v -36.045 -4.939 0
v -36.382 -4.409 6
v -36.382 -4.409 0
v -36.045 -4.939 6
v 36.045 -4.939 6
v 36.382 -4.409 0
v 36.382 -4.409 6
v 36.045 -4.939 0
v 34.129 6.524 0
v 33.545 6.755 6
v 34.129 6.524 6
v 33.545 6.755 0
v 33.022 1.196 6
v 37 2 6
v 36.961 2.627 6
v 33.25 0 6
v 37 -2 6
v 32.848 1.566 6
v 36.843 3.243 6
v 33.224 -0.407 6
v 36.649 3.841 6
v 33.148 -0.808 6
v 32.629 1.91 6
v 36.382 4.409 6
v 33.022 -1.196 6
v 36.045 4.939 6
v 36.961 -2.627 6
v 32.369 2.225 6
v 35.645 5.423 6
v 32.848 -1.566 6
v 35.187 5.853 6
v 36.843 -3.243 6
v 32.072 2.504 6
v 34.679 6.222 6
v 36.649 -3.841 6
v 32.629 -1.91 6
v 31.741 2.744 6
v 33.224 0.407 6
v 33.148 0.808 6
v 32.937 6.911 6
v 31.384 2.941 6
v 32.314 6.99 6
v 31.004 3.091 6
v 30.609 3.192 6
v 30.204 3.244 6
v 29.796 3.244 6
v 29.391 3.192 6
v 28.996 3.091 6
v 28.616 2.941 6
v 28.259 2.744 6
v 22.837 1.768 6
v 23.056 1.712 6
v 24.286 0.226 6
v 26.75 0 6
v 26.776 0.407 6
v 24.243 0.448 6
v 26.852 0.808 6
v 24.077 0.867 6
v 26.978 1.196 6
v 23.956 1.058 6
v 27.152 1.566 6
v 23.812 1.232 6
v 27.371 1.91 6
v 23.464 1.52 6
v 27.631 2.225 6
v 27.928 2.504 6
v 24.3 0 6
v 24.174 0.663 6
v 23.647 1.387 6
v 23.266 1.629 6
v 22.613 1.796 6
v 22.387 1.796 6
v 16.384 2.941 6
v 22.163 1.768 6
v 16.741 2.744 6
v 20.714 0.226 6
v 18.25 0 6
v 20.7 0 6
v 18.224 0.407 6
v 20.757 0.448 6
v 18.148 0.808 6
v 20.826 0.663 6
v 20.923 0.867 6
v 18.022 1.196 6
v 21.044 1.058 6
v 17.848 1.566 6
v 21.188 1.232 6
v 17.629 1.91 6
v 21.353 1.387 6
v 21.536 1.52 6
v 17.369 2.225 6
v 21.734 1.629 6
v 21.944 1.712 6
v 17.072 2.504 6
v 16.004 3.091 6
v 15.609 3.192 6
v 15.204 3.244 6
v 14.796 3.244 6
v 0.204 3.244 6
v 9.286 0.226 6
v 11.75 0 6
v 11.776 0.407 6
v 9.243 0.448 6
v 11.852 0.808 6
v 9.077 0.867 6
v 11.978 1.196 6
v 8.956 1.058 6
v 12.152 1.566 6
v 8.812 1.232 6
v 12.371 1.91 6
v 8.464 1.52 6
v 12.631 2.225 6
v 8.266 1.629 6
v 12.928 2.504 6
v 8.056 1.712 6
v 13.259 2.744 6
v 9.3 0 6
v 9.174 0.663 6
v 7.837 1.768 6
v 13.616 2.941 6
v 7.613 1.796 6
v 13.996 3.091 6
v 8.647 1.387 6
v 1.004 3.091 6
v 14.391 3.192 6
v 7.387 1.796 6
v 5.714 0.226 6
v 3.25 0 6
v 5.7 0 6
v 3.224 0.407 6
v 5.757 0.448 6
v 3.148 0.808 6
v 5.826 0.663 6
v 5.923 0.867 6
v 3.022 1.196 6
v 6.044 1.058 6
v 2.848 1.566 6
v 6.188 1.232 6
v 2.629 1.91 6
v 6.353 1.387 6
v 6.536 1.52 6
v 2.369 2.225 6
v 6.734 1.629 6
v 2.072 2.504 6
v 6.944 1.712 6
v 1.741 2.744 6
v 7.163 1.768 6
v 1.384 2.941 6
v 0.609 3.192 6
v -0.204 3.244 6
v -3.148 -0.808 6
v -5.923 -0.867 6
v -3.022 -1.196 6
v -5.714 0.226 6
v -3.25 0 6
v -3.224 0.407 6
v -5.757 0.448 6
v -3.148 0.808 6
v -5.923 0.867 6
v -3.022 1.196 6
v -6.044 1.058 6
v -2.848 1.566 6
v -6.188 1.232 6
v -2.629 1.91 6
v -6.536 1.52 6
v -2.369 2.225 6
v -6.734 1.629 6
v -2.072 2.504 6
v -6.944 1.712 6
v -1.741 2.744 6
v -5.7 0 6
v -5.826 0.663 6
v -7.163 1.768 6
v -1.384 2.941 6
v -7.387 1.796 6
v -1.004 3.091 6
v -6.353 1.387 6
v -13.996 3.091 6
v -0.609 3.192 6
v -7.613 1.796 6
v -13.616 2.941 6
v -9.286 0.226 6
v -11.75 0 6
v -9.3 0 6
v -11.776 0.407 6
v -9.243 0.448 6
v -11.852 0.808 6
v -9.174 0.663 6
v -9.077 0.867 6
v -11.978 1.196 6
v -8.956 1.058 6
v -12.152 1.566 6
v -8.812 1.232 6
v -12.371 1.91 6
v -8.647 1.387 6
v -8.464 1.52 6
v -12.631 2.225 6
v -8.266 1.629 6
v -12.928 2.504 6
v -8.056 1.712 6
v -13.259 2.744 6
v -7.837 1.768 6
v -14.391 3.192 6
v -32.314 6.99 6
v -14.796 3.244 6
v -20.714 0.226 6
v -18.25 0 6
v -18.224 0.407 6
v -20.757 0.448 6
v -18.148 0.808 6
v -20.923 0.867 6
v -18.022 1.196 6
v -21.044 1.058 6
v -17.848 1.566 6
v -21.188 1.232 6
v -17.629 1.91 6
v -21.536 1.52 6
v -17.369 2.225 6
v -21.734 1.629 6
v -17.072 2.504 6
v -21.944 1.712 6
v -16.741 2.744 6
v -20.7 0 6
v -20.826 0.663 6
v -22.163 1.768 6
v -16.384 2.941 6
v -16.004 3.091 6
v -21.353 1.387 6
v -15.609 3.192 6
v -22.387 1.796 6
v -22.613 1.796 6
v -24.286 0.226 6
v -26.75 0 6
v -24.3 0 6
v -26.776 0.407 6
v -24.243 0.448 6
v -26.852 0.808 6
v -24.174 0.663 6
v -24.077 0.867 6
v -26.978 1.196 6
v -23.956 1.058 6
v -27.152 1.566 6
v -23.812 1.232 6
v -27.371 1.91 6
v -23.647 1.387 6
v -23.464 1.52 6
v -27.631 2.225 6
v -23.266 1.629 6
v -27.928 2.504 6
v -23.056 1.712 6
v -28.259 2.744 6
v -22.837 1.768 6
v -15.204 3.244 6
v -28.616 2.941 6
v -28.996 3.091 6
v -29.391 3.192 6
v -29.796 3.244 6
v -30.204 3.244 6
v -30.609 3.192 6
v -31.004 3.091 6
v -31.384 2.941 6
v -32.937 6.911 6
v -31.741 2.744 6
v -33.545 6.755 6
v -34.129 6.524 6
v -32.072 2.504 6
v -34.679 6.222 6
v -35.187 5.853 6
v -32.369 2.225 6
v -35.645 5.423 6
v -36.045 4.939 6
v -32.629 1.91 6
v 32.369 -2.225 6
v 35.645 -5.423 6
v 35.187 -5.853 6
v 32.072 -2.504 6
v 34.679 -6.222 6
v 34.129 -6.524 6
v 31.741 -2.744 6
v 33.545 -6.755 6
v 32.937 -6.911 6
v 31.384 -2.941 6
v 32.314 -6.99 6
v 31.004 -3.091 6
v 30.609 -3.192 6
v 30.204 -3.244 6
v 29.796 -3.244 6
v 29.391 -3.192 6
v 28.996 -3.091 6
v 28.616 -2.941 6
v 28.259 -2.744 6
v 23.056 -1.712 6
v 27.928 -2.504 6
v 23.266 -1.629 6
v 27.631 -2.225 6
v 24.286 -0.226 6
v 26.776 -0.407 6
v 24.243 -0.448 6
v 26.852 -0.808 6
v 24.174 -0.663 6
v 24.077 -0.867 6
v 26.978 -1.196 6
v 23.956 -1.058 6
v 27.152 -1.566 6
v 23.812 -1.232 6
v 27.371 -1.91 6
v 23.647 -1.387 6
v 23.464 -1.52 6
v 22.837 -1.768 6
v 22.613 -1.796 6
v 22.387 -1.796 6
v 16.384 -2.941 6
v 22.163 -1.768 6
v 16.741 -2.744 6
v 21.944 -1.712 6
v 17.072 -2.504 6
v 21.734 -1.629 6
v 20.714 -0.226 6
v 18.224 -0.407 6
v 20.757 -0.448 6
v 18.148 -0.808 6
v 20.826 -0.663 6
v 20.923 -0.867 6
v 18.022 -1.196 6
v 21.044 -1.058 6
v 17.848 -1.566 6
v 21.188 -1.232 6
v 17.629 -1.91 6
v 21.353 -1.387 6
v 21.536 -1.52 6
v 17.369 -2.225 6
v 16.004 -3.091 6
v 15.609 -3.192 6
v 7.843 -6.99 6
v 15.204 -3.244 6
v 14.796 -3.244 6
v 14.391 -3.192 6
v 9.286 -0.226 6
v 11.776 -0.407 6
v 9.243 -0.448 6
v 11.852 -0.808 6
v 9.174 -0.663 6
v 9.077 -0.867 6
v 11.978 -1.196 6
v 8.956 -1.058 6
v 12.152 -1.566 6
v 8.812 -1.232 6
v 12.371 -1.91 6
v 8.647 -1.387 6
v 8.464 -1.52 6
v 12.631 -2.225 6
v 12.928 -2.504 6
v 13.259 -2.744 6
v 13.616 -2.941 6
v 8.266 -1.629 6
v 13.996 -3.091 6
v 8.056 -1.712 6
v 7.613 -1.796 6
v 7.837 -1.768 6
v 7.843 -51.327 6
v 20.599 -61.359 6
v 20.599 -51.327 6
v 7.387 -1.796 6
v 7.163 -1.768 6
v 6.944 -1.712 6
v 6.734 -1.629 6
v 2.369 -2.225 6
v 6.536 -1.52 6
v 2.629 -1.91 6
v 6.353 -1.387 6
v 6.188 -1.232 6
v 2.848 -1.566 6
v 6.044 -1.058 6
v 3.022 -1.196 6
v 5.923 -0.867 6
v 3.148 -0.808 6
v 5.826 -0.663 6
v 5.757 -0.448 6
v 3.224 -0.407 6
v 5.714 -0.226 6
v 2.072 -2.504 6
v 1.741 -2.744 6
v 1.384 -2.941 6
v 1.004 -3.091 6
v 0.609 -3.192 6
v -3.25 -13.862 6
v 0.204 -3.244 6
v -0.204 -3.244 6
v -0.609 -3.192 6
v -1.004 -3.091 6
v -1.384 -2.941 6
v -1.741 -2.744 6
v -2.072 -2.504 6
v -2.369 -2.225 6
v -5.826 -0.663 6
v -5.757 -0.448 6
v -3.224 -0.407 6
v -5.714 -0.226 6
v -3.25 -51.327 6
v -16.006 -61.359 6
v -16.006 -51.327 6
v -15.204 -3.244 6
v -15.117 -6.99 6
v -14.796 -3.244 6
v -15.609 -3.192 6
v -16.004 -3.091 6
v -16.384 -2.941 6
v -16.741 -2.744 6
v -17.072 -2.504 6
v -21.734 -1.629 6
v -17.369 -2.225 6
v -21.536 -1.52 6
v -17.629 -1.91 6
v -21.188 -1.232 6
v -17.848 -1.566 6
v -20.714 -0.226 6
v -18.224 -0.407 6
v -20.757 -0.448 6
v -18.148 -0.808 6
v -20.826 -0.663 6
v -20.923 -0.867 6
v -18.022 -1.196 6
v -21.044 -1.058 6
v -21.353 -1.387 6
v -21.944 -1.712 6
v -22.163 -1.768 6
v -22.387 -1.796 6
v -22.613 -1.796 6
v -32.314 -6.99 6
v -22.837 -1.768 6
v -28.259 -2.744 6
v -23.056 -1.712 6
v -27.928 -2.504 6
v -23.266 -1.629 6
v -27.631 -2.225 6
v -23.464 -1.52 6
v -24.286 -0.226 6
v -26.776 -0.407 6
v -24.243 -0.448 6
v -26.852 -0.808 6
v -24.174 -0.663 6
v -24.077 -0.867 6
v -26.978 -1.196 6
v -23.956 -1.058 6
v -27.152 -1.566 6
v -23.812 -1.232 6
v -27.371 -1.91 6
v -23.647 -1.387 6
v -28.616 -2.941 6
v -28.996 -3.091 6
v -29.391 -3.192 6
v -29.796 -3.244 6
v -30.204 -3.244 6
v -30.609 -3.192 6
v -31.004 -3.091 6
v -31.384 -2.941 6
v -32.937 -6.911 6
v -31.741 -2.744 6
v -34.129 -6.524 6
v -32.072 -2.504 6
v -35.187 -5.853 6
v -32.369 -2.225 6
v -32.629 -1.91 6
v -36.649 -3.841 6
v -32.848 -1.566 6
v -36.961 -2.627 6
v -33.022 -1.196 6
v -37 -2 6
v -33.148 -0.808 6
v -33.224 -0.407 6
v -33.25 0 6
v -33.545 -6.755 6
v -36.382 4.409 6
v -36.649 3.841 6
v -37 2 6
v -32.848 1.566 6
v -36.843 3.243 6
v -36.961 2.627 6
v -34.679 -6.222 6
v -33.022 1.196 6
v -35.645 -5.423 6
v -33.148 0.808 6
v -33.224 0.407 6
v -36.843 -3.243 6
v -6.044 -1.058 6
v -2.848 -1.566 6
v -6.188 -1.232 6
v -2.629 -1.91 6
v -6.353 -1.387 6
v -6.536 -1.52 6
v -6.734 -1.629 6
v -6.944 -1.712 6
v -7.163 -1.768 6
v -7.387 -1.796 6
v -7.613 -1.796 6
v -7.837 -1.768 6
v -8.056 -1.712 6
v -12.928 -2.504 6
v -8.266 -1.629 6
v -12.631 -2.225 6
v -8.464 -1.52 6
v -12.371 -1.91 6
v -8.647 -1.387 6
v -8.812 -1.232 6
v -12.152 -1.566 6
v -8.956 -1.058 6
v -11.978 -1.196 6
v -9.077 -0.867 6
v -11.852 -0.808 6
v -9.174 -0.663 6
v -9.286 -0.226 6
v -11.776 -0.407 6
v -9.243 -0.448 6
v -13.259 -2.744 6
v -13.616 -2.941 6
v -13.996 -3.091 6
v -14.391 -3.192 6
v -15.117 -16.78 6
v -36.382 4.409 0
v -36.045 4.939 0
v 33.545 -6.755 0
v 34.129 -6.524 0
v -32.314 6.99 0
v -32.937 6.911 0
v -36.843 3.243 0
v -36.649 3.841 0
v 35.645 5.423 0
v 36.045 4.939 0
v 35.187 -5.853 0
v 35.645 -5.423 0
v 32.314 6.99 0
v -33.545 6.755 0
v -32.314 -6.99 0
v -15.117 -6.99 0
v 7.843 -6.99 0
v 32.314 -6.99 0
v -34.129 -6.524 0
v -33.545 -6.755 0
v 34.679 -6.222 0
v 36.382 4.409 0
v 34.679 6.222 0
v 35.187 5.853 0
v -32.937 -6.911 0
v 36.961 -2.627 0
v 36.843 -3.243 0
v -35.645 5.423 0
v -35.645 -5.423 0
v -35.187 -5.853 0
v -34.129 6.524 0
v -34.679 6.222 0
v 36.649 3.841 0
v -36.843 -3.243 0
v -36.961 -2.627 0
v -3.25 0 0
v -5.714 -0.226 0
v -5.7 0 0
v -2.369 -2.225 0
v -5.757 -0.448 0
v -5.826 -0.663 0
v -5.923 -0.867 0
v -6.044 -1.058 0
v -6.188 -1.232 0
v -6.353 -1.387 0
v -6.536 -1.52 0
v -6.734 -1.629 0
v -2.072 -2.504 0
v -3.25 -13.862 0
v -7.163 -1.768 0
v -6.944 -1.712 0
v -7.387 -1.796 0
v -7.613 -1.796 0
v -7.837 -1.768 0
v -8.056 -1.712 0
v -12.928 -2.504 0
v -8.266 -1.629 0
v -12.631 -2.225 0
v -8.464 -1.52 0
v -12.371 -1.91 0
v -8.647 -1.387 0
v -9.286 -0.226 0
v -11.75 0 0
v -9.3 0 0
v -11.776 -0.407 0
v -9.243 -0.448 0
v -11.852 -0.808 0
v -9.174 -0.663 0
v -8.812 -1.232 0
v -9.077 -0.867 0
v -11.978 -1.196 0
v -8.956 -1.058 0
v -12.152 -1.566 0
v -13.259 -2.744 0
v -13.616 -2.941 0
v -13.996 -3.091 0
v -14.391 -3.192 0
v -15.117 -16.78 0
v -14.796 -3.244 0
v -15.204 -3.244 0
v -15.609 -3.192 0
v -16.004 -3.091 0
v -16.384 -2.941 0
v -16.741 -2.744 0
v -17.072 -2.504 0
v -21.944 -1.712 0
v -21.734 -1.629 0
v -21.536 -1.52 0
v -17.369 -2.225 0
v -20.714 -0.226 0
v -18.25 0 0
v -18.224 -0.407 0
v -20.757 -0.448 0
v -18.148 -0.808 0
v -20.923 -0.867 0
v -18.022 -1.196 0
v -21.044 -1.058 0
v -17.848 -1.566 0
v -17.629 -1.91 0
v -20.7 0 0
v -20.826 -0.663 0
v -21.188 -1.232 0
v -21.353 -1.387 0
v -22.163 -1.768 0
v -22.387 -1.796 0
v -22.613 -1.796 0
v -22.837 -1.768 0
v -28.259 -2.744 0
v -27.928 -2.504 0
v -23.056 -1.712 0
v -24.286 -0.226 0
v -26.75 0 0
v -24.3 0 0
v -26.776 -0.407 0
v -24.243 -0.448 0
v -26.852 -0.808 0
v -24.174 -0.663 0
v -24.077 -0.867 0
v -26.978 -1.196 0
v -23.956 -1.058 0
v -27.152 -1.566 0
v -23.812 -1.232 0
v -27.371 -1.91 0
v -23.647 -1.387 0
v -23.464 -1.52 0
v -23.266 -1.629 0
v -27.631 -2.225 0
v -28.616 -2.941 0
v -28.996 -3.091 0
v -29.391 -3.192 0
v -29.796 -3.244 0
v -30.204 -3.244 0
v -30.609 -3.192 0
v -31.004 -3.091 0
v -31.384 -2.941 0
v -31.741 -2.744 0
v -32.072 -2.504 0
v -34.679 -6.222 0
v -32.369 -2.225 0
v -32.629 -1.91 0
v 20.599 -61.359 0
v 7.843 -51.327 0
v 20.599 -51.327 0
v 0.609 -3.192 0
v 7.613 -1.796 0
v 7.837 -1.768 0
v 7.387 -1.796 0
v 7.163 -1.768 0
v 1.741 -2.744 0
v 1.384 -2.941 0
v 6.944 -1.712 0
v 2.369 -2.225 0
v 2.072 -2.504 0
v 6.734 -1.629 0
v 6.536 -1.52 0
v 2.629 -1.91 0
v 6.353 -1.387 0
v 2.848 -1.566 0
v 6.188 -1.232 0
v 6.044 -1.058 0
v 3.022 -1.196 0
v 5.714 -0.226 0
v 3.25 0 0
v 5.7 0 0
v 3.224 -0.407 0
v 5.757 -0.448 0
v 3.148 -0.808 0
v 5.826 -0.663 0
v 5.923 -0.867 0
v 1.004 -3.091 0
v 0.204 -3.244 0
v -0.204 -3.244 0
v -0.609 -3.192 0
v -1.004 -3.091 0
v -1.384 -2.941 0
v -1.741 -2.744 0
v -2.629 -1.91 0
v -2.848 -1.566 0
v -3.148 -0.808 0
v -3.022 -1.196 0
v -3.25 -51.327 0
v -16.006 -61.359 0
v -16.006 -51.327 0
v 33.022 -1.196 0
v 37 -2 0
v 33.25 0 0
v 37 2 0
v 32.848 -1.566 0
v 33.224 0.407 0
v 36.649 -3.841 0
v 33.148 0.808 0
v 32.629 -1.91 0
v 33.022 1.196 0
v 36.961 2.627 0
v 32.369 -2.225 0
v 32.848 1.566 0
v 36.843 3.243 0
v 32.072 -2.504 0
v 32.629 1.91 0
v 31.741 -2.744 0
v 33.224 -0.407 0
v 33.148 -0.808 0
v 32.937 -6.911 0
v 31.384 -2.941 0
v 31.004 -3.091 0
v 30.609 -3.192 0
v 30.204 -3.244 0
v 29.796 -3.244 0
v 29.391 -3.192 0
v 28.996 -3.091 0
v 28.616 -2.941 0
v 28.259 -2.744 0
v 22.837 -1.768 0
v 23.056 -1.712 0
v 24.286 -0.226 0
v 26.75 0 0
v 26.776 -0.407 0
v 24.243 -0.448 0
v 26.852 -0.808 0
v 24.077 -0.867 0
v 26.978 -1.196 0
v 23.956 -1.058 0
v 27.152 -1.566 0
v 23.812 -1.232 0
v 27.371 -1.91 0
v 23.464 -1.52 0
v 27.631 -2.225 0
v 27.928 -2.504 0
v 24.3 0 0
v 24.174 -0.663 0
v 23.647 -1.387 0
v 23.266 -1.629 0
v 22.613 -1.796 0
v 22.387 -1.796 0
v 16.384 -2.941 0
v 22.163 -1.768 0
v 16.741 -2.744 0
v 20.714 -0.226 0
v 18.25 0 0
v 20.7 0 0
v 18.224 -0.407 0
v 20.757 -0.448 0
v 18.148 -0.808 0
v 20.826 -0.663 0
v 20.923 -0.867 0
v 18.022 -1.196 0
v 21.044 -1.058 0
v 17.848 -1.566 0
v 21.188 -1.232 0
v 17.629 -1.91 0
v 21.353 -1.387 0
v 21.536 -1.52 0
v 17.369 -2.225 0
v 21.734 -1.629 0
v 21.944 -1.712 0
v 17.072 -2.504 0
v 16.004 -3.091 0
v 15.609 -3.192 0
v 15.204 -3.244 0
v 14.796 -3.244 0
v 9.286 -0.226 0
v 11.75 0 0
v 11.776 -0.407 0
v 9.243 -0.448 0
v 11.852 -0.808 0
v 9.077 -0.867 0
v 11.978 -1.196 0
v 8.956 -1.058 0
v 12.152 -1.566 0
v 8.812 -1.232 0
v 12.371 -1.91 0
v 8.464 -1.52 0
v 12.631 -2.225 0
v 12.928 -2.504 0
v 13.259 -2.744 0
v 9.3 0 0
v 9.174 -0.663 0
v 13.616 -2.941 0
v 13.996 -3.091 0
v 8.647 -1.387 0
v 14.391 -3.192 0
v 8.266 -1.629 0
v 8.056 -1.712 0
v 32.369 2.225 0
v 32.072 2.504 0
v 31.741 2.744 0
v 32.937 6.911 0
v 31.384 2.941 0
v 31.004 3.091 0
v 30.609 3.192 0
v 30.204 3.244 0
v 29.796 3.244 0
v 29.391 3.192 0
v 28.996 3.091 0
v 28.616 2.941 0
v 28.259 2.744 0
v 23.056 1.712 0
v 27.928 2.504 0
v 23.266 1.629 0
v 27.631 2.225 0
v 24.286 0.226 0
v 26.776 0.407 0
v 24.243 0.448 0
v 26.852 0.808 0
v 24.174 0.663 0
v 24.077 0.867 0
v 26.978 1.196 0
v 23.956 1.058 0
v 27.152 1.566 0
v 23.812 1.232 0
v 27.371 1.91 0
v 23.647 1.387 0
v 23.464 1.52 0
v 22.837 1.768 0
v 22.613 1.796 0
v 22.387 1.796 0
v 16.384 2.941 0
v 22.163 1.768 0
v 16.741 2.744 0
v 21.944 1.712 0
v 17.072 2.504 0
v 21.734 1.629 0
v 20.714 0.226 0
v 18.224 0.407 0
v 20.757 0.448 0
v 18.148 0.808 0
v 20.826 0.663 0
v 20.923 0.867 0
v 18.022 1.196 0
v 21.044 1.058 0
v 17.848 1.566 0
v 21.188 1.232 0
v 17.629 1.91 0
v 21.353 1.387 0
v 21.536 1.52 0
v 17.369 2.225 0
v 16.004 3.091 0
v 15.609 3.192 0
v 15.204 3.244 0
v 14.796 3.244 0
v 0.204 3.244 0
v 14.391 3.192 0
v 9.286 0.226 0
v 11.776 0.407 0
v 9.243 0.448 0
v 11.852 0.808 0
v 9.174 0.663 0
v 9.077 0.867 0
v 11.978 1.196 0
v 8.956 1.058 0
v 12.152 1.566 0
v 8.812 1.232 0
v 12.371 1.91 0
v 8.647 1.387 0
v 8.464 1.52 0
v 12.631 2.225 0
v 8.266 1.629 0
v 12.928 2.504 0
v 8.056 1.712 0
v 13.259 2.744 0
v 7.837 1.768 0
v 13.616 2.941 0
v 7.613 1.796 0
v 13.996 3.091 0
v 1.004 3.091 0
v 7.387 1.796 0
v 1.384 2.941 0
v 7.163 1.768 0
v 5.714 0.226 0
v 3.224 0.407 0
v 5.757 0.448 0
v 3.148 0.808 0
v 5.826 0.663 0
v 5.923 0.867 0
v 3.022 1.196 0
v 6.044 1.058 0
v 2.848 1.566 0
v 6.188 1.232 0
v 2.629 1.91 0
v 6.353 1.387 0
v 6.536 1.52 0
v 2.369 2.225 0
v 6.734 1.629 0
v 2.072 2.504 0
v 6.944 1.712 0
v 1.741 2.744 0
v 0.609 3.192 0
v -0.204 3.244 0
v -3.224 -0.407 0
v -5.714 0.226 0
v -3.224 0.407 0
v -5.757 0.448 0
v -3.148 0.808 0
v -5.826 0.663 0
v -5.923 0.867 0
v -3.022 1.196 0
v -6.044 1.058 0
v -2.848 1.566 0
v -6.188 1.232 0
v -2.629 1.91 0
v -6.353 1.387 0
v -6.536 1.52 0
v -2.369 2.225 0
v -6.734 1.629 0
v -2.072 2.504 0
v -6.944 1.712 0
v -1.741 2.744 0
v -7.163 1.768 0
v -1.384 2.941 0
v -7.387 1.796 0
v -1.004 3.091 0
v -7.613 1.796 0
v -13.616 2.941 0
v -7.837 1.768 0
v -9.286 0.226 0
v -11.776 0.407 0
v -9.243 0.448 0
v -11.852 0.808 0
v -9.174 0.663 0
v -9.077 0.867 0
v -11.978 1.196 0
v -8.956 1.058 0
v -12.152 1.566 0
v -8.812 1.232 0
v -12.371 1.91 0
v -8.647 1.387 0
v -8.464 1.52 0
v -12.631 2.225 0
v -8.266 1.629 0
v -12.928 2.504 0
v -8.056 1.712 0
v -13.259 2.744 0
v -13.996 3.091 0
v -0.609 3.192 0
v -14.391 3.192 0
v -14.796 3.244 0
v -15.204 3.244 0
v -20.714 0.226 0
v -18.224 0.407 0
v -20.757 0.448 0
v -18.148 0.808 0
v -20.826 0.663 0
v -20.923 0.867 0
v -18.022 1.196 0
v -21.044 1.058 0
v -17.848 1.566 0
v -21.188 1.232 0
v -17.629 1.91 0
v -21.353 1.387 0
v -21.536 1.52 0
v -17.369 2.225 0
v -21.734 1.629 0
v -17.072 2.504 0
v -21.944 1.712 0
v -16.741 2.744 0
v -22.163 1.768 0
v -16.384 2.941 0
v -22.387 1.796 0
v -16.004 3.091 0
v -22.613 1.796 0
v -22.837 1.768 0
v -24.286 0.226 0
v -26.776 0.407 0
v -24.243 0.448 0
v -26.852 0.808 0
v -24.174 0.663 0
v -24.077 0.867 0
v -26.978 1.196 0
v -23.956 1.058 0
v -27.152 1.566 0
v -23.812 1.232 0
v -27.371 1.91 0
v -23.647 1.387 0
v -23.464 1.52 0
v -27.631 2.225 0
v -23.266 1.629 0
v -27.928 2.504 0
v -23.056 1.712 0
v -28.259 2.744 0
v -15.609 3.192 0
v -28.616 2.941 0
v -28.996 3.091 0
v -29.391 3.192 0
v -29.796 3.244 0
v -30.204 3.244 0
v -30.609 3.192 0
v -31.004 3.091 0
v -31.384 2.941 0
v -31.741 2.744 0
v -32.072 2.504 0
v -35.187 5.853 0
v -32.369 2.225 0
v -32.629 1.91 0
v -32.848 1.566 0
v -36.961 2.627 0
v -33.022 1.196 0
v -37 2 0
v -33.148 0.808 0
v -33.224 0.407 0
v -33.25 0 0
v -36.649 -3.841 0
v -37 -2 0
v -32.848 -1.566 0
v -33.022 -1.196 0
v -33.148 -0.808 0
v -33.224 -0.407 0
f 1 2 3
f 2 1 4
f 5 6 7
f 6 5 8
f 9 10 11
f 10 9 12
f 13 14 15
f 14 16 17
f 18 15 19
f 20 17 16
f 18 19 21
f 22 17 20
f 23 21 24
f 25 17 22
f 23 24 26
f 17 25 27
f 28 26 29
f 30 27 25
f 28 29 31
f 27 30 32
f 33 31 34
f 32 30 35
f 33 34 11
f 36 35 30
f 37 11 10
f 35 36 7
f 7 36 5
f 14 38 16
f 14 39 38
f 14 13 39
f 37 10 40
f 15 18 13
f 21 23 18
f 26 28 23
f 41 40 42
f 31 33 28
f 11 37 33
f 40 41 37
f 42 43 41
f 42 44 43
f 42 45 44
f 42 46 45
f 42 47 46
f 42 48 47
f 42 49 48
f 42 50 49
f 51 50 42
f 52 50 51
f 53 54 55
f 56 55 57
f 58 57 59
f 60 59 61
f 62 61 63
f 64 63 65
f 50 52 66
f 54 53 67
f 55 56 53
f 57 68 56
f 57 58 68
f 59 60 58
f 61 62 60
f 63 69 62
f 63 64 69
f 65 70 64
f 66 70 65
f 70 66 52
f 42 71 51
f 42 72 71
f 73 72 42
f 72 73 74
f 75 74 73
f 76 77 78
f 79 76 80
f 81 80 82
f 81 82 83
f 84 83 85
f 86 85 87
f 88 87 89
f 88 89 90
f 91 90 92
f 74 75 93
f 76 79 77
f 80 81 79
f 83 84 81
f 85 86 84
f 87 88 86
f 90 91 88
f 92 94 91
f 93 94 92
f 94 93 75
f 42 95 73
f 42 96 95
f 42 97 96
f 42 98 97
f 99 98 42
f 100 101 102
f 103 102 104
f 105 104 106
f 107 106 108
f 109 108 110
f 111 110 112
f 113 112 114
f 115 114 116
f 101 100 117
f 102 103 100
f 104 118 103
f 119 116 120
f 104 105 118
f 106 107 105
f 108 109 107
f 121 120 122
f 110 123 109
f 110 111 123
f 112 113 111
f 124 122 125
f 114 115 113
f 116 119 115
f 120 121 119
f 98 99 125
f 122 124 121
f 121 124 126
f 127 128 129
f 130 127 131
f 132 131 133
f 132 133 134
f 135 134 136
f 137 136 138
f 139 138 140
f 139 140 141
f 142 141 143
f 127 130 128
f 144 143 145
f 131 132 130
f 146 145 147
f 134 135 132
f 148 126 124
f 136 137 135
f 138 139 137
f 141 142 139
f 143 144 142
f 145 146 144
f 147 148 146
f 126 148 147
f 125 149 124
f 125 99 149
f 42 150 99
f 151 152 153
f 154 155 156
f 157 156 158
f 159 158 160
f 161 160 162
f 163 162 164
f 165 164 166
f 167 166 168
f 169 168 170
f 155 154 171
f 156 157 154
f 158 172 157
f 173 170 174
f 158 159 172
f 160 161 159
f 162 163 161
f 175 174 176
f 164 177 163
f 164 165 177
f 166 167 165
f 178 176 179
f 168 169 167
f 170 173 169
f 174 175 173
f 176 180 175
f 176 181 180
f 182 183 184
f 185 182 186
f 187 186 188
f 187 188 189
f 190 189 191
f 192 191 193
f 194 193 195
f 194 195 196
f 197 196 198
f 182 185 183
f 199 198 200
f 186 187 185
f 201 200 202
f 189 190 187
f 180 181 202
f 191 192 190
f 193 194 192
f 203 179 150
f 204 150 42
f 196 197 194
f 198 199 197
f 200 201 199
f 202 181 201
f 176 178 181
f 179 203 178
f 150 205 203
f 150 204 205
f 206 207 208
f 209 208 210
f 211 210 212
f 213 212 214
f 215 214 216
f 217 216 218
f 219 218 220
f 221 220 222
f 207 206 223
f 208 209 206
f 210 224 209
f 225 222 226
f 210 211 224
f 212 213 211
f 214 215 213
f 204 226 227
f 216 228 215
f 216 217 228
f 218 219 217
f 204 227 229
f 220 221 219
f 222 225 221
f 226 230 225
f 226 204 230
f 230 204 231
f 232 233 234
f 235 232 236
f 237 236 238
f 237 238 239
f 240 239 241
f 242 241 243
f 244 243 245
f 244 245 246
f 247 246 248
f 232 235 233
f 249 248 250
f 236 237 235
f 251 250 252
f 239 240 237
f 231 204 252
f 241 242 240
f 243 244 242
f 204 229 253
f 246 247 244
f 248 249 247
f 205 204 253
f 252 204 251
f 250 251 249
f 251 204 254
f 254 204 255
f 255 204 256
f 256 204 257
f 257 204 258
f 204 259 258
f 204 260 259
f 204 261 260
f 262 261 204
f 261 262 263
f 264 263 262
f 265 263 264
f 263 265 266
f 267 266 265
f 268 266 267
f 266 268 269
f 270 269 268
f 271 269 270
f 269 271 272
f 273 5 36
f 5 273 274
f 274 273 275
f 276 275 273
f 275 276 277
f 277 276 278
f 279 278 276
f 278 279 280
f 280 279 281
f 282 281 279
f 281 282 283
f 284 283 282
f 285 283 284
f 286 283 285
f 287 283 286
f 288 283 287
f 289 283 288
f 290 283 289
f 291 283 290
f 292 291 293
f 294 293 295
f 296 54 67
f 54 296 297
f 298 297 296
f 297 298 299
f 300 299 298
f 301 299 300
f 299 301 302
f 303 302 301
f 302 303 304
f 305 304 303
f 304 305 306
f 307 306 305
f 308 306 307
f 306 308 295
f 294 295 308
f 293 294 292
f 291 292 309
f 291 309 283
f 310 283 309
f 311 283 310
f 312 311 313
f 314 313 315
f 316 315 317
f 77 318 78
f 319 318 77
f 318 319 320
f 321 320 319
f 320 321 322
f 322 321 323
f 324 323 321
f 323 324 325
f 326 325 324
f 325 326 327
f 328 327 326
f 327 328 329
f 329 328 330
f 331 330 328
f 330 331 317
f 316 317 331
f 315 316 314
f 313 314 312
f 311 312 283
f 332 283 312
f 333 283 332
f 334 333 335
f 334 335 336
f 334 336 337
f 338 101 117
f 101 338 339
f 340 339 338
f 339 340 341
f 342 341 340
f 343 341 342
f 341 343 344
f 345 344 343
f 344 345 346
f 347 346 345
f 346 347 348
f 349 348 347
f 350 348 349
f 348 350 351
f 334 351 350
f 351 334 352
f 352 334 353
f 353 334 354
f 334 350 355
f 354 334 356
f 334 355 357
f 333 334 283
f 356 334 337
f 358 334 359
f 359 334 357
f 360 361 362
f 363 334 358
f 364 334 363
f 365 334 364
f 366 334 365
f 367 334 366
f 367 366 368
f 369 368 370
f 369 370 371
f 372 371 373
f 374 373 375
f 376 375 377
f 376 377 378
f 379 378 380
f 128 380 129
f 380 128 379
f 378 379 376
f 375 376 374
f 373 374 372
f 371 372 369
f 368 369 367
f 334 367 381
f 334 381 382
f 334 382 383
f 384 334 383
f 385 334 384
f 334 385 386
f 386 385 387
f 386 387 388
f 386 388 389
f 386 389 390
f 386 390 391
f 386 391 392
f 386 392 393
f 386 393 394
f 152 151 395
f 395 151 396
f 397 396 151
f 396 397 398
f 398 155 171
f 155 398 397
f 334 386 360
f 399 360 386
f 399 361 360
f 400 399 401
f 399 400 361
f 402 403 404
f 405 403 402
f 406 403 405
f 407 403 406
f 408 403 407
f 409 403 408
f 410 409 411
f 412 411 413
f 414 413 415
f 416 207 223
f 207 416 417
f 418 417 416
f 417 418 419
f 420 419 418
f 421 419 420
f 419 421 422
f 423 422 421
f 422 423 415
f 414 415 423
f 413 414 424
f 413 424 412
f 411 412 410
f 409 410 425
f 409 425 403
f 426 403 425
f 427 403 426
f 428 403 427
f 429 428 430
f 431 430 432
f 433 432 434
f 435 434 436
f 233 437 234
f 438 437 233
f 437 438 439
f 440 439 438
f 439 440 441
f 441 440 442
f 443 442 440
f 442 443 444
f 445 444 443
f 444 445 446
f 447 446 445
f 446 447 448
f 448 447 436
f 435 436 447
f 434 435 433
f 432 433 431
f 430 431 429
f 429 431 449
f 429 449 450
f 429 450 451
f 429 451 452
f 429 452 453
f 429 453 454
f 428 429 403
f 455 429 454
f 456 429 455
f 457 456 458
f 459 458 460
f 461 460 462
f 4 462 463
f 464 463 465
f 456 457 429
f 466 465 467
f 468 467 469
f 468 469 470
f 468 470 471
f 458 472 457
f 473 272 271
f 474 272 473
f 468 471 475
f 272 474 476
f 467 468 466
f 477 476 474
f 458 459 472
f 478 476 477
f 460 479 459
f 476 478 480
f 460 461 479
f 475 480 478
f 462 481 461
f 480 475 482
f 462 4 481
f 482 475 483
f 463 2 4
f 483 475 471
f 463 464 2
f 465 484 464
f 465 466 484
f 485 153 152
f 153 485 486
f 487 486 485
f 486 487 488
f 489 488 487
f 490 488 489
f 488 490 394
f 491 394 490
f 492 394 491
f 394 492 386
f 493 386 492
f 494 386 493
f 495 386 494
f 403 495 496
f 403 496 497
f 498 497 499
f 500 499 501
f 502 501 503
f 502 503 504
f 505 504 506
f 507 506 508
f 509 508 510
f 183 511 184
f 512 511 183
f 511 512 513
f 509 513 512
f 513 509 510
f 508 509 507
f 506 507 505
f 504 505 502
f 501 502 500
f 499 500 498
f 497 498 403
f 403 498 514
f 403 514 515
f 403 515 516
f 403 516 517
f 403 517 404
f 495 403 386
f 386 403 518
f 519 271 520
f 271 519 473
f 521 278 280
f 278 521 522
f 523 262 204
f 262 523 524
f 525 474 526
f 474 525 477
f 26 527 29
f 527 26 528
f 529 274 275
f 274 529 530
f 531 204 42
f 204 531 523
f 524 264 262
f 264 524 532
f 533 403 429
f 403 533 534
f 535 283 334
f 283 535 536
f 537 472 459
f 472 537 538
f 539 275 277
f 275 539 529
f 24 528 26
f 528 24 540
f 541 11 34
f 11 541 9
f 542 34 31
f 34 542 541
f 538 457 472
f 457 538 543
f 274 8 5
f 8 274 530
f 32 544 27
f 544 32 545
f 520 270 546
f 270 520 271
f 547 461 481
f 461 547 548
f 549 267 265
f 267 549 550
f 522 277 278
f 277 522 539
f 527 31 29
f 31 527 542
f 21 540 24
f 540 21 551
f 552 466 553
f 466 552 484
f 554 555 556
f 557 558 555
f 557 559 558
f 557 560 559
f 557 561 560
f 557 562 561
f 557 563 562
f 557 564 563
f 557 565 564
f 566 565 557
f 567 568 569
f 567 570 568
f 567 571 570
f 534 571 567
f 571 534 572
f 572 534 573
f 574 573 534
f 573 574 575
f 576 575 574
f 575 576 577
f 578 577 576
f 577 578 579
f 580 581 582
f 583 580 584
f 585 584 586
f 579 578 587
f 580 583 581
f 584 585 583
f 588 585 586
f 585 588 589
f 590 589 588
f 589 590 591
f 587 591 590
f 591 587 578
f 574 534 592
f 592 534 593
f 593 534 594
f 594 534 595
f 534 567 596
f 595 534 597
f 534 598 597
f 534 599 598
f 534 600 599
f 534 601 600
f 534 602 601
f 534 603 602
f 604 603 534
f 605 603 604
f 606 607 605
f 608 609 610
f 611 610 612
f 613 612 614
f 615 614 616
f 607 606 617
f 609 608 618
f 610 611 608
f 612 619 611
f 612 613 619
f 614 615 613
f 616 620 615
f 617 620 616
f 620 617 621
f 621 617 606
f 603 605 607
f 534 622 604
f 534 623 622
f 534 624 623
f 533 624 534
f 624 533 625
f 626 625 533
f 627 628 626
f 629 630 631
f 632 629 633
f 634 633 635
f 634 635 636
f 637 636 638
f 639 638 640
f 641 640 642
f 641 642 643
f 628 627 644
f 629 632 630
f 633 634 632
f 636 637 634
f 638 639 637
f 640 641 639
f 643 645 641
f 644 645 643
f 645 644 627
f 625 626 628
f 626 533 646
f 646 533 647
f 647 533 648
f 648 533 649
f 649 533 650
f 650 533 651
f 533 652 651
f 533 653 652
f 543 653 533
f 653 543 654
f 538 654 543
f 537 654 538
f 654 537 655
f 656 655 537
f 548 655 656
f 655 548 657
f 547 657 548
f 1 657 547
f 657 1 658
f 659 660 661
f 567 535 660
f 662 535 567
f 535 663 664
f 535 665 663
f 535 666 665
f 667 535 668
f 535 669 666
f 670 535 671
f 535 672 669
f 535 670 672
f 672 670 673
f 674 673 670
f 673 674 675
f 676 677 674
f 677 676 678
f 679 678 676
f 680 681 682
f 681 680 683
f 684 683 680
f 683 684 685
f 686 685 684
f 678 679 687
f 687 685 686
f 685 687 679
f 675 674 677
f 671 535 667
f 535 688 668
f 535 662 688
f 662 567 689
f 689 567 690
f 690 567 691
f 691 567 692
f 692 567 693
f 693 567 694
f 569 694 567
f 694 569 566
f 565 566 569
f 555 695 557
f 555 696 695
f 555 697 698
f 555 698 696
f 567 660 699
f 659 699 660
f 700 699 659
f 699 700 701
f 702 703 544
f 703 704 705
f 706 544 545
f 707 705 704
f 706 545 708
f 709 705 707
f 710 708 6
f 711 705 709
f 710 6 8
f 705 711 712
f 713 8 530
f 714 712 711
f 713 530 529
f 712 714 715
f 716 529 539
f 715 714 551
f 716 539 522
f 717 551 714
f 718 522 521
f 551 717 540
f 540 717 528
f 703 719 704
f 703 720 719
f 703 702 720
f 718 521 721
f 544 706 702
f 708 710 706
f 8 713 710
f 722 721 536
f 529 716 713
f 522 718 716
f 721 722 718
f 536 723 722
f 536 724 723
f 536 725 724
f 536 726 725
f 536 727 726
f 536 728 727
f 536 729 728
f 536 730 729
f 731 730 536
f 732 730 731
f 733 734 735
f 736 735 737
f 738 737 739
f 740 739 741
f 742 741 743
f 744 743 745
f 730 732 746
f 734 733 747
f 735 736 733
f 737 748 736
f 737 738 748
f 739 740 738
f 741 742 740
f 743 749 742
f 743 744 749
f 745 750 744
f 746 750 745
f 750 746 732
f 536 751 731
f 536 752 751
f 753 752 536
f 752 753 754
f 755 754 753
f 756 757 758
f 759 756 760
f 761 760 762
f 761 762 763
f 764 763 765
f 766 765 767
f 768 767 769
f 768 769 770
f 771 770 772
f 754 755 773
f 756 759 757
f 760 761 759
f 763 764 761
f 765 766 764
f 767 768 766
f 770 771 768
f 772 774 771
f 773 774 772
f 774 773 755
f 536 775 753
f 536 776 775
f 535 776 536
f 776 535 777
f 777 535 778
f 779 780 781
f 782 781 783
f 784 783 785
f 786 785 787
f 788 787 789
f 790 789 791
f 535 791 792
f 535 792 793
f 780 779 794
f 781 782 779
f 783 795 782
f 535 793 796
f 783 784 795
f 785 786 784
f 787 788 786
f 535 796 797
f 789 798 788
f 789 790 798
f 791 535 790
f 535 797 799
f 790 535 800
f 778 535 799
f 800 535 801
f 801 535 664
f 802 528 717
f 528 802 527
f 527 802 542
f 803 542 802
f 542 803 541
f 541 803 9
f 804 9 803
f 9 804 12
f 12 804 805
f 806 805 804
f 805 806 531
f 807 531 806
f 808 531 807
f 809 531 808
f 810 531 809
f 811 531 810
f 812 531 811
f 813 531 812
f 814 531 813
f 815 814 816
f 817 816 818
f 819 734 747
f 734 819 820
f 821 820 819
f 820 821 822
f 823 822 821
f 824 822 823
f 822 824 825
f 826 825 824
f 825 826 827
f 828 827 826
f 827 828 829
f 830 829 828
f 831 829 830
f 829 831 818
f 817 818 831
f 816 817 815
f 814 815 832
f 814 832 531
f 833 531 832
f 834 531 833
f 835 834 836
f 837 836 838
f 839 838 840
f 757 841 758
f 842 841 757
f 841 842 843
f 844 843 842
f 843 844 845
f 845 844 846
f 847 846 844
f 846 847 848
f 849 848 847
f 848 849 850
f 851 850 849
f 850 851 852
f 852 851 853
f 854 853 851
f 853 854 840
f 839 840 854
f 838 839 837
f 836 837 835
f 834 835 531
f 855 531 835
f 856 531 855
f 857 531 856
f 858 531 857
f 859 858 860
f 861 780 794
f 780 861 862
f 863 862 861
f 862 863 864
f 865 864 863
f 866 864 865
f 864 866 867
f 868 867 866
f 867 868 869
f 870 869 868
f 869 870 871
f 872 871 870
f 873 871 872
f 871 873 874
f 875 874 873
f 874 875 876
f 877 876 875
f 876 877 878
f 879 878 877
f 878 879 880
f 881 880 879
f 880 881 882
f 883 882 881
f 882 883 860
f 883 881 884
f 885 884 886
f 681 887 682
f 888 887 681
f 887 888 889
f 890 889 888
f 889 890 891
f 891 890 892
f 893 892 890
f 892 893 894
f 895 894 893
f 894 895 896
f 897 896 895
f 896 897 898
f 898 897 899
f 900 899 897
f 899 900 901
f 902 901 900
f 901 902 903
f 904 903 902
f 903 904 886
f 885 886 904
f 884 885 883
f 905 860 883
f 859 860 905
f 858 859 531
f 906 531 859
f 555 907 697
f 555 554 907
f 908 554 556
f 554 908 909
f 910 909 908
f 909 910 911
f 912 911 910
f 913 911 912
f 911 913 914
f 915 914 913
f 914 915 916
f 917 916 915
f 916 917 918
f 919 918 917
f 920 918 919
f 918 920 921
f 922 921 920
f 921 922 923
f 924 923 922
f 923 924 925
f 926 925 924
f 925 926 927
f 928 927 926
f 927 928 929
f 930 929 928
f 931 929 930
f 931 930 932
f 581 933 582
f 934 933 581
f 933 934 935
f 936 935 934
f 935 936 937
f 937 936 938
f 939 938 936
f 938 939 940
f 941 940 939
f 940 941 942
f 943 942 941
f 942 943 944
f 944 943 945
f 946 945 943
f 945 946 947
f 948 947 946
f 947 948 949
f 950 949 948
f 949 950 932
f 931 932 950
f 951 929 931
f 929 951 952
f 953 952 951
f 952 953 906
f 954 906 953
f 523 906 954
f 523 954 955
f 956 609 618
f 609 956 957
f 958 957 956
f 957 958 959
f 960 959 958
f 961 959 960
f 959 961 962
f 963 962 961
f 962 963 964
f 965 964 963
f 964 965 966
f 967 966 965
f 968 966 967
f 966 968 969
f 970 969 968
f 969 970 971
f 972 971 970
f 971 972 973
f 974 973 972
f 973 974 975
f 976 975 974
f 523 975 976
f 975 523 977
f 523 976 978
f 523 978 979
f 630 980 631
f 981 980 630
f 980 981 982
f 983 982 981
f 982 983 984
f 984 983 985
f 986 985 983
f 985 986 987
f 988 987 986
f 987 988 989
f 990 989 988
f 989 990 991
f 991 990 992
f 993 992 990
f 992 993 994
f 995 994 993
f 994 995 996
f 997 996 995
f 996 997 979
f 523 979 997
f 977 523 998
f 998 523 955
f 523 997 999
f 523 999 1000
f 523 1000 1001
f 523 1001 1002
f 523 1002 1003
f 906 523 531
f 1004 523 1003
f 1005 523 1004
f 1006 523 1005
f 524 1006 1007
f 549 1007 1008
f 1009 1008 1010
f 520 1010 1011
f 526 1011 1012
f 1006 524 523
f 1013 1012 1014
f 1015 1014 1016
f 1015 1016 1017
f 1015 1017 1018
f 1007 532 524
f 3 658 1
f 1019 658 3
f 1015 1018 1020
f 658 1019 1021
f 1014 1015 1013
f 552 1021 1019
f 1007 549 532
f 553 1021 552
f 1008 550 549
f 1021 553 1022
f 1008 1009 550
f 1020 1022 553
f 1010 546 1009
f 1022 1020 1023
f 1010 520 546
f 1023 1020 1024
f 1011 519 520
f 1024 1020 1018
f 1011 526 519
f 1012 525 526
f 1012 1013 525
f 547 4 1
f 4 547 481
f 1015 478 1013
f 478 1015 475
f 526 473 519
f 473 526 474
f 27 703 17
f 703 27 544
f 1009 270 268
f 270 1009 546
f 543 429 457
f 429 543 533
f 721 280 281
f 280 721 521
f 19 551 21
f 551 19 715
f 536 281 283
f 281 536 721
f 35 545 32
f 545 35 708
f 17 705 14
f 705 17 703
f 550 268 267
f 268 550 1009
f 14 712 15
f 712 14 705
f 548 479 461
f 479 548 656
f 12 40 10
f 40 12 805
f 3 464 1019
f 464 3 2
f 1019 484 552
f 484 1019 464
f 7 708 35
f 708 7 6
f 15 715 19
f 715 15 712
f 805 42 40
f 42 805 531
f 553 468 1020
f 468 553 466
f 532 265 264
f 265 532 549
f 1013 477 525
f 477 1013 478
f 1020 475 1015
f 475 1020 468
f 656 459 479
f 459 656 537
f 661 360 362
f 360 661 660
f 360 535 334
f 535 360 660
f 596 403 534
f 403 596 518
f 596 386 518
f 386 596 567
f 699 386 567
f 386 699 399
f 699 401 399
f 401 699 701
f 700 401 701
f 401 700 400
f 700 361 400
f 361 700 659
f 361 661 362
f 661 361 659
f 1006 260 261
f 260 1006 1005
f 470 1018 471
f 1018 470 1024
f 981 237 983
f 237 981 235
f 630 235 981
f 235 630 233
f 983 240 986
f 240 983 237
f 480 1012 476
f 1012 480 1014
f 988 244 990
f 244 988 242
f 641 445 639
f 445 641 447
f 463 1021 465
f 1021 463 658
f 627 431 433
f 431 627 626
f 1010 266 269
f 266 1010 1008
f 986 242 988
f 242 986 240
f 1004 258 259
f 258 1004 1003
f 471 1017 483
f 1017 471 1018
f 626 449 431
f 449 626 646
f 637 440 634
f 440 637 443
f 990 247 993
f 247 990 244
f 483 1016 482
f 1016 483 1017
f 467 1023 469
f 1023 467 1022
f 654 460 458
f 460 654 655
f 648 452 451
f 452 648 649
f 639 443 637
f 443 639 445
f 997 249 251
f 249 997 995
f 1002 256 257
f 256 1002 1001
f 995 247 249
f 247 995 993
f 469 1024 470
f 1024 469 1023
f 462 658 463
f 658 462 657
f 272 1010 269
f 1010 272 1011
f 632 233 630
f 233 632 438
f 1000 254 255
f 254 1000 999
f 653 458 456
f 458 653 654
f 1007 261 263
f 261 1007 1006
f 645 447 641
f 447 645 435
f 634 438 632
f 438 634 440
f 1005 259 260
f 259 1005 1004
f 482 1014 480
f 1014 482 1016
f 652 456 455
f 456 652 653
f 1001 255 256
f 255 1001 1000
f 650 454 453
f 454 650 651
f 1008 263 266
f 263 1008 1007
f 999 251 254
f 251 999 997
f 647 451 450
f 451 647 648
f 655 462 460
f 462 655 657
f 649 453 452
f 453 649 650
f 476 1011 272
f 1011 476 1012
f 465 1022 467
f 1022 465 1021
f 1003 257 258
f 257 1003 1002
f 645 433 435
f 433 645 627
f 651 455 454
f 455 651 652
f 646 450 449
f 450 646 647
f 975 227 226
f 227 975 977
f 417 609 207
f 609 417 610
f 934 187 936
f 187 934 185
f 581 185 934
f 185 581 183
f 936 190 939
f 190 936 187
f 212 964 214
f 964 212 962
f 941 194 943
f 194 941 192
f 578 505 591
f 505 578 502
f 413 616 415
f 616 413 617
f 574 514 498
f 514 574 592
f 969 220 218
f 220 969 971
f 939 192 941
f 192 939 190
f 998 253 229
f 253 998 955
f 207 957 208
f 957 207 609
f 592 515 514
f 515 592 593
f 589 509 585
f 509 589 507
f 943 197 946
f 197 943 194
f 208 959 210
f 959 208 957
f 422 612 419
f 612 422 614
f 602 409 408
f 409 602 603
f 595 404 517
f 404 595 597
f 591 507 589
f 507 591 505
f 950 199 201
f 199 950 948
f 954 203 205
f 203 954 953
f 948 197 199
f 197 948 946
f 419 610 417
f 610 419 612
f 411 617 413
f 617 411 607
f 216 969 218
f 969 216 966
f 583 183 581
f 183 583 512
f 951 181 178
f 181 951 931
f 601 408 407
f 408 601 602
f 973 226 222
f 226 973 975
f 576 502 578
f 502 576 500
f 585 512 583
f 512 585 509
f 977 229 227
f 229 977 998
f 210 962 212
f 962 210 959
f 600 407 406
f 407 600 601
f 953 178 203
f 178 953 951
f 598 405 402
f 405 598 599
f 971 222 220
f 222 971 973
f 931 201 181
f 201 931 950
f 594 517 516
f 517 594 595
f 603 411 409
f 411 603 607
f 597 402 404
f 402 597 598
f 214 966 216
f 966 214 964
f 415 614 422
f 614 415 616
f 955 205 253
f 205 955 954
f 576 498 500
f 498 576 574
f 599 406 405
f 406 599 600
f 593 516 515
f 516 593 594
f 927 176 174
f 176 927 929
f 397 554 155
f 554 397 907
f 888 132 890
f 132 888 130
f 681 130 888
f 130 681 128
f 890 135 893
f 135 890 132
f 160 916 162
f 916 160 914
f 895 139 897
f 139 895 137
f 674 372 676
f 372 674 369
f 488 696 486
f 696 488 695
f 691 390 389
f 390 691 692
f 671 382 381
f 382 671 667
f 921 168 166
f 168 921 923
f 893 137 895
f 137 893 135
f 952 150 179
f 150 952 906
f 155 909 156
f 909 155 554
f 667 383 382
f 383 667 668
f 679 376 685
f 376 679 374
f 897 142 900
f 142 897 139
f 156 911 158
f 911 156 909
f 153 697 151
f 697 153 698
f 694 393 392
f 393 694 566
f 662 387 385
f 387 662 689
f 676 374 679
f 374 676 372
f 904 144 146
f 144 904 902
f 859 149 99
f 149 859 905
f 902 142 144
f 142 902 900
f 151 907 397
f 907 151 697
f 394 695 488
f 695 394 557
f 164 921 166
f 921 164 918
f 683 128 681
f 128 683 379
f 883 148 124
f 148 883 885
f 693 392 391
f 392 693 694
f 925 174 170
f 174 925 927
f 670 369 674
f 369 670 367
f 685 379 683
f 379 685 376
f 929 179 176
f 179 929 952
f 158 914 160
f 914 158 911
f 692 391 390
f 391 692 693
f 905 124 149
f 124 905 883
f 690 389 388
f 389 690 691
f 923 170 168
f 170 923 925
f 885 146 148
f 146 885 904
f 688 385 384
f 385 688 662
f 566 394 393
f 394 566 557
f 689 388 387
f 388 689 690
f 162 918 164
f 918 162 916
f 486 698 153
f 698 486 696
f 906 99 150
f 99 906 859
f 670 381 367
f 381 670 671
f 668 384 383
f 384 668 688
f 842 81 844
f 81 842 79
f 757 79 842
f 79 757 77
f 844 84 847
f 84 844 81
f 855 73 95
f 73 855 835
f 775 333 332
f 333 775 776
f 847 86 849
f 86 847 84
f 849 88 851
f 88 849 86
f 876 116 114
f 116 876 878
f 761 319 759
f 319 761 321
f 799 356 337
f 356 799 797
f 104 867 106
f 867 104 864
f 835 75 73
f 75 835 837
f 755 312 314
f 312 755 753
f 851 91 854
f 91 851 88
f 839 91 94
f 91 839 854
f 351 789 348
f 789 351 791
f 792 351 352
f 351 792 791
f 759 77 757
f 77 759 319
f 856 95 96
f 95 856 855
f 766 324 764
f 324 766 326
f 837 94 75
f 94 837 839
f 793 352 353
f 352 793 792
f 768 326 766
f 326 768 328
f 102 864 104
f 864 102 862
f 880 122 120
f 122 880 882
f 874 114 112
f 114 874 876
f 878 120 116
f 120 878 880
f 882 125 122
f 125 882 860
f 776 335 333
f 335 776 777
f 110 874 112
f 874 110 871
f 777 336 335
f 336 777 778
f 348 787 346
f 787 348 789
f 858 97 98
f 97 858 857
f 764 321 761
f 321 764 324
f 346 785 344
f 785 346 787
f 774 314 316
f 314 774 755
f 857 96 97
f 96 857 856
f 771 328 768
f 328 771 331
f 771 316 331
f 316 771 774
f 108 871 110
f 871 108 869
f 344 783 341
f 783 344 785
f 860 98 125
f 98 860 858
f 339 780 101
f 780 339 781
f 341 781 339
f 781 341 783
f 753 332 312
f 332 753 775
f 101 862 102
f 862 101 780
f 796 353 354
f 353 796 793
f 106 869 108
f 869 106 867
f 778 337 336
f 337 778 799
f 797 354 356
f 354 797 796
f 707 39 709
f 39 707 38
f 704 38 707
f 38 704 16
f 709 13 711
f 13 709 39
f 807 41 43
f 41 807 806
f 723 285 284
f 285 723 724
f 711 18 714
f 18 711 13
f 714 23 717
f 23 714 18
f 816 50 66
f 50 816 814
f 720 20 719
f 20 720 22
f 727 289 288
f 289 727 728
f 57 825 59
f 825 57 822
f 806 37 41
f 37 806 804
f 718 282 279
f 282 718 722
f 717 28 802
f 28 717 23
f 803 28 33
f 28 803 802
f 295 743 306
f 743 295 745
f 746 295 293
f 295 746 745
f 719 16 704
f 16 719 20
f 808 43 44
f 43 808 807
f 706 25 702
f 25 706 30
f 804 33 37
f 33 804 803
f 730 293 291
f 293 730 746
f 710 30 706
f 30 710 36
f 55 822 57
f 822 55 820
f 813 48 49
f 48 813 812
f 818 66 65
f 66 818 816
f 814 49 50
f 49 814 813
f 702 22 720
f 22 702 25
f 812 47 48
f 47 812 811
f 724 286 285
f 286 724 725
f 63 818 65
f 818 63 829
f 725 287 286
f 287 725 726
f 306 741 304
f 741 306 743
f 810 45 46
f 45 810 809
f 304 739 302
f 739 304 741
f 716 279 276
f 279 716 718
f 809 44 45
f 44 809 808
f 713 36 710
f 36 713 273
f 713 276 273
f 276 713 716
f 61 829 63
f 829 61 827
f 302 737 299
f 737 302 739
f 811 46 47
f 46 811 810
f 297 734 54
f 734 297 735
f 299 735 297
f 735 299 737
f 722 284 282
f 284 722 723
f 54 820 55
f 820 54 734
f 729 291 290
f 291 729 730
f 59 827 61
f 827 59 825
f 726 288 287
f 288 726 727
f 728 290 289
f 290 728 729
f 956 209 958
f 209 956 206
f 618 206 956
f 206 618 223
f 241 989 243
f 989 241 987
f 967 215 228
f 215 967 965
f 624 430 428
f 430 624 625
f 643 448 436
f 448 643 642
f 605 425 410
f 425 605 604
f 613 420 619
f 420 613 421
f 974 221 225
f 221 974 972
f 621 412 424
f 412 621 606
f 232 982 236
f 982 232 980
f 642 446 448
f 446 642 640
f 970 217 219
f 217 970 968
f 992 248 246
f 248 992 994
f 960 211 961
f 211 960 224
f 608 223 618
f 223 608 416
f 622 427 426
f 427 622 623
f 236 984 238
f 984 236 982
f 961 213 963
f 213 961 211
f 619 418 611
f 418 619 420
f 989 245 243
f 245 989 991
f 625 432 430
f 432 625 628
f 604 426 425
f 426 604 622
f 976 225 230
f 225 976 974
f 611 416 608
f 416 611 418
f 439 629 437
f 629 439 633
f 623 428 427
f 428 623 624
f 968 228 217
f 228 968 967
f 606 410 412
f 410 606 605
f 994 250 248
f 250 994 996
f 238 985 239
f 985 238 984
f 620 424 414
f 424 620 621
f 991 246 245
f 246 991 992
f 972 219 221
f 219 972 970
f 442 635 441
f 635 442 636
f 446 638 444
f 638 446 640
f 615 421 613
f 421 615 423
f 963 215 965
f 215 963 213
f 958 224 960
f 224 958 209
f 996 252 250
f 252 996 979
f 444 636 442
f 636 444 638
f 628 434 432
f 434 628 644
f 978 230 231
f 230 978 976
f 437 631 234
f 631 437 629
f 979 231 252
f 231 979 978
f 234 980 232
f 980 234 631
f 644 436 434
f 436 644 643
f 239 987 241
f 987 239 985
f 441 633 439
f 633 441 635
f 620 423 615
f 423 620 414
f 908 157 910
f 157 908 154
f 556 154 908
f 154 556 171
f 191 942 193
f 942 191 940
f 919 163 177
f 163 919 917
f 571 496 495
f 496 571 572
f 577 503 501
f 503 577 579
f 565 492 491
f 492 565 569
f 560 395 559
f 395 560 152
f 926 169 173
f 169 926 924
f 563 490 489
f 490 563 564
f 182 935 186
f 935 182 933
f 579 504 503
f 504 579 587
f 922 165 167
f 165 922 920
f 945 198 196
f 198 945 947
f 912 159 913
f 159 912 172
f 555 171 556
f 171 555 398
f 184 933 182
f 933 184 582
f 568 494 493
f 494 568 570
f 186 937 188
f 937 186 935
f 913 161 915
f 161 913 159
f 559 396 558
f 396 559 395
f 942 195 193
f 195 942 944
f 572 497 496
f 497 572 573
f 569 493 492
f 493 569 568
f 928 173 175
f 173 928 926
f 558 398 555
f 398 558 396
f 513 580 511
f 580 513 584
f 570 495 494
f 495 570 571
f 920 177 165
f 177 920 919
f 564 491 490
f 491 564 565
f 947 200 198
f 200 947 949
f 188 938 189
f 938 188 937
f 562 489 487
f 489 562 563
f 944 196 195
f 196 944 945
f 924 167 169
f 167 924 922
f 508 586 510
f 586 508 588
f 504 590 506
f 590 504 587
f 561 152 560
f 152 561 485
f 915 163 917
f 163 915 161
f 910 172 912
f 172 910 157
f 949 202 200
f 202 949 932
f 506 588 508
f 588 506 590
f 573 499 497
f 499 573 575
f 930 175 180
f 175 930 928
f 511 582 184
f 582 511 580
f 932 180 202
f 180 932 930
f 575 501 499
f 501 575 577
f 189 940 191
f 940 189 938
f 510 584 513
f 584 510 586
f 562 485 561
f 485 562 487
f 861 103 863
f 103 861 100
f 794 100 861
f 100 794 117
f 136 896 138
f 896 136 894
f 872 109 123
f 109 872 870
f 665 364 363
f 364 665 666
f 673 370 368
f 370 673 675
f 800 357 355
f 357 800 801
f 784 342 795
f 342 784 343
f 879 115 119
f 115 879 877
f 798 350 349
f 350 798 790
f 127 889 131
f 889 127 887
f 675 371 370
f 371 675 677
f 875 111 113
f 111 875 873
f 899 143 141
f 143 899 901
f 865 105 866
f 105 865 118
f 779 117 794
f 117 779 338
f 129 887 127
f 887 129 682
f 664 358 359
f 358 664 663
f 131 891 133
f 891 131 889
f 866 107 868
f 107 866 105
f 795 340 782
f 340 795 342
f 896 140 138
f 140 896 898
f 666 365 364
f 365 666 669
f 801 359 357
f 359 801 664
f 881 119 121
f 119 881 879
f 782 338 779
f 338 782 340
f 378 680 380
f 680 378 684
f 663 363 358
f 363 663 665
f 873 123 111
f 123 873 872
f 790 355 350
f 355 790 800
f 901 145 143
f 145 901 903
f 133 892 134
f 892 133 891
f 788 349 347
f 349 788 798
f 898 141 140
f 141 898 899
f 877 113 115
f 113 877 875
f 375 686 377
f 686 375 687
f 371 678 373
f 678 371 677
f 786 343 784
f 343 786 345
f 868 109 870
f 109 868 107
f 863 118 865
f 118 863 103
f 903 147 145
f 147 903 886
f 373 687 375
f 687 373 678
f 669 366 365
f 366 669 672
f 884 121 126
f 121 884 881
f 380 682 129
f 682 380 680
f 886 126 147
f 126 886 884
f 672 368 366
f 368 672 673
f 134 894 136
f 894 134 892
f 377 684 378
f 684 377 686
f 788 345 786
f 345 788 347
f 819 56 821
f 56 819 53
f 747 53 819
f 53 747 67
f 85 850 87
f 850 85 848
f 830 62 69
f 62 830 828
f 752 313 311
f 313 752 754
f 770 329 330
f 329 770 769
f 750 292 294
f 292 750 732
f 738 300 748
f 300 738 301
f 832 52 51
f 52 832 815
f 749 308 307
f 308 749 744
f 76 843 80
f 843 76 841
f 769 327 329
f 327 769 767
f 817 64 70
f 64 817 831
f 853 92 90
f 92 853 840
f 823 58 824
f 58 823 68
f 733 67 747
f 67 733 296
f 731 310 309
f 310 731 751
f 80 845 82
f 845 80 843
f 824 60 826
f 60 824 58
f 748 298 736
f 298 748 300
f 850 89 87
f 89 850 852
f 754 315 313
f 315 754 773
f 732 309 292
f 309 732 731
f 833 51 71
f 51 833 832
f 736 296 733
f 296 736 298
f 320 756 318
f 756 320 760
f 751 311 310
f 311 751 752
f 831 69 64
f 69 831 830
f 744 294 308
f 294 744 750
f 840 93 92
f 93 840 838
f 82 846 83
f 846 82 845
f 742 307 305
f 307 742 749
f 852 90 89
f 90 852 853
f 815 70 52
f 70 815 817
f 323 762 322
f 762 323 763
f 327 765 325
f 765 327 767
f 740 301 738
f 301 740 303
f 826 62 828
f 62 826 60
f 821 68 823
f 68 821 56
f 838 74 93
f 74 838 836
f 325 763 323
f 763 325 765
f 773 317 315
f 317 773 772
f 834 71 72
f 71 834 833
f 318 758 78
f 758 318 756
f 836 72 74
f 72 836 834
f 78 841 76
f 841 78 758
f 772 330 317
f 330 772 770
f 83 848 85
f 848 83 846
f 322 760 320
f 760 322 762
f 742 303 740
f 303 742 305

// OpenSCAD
$fn = 50;


difference() {
	union() {
		hull() {
			translate(v = [-32.0000000000, 2.0000000000, 0]) {
				cylinder(h = 6, r = 5);
			}
			translate(v = [32.0000000000, 2.0000000000, 0]) {
				cylinder(h = 6, r = 5);
			}
			translate(v = [-32.0000000000, -2.0000000000, 0]) {
				cylinder(h = 6, r = 5);
			}
			translate(v = [32.0000000000, -2.0000000000, 0]) {
				cylinder(h = 6, r = 5);
			}
		}
		translate(v = [0, -5, 0]) {
			linear_extrude(height = 6) {
				text(font = "DejaVu Sans Mono:style=Bold", halign = "center", size = 57.0000000000, text = "1", valign = "top");
			}
		}
	}
	union() {
		translate(v = [-30.0000000000, 0.0000000000, 0]) {
			translate(v = [0, 0, -100]) {
				cylinder(h = 200, r = 3.2500000000);
			}
		}
		translate(v = [-15.0000000000, 0.0000000000, 0]) {
			translate(v = [0, 0, -100]) {
				cylinder(h = 200, r = 3.2500000000);
			}
		}
		translate(v = [0, 0, -100]) {
			cylinder(h = 200, r = 3.2500000000);
		}
		translate(v = [15.0000000000, 0.0000000000, 0]) {
			translate(v = [0, 0, -100]) {
				cylinder(h = 200, r = 3.2500000000);
			}
		}
		translate(v = [30.0000000000, 0.0000000000, 0]) {
			translate(v = [0, 0, -100]) {
				cylinder(h = 200, r = 3.2500000000);
			}
		}
		translate(v = [-30.0000000000, 0.0000000000, 0]) {
			translate(v = [0, 0, -100]) {
				cylinder(h = 200, r = 1.8000000000);
			}
		}
		translate(v = [-22.5000000000, 0.0000000000, 0]) {
			translate(v = [0, 0, -100]) {
				cylinder(h = 200, r = 1.8000000000);
			}
		}
		translate(v = [-15.0000000000, 0.0000000000, 0]) {
			translate(v = [0, 0, -100]) {
				cylinder(h = 200, r = 1.8000000000);
			}
		}
		translate(v = [-7.5000000000, 0.0000000000, 0]) {
			translate(v = [0, 0, -100]) {
				cylinder(h = 200, r = 1.8000000000);
			}
		}
		translate(v = [0, 0, -100]) {
			cylinder(h = 200, r = 1.8000000000);
		}
		translate(v = [7.5000000000, 0.0000000000, 0]) {
			translate(v = [0, 0, -100]) {
				cylinder(h = 200, r = 1.8000000000);
			}
		}
		translate(v = [15.0000000000, 0.0000000000, 0]) {
			translate(v = [0, 0, -100]) {
				cylinder(h = 200, r = 1.8000000000);
			}
		}
		translate(v = [22.5000000000, 0.0000000000, 0]) {
			translate(v = [0, 0, -100]) {
				cylinder(h = 200, r = 1.8000000000);
			}
		}
		translate(v = [30.0000000000, 0.0000000000, 0]) {
			translate(v = [0, 0, -100]) {
				cylinder(h = 200, r = 1.8000000000);
			}
		}
	}
}
